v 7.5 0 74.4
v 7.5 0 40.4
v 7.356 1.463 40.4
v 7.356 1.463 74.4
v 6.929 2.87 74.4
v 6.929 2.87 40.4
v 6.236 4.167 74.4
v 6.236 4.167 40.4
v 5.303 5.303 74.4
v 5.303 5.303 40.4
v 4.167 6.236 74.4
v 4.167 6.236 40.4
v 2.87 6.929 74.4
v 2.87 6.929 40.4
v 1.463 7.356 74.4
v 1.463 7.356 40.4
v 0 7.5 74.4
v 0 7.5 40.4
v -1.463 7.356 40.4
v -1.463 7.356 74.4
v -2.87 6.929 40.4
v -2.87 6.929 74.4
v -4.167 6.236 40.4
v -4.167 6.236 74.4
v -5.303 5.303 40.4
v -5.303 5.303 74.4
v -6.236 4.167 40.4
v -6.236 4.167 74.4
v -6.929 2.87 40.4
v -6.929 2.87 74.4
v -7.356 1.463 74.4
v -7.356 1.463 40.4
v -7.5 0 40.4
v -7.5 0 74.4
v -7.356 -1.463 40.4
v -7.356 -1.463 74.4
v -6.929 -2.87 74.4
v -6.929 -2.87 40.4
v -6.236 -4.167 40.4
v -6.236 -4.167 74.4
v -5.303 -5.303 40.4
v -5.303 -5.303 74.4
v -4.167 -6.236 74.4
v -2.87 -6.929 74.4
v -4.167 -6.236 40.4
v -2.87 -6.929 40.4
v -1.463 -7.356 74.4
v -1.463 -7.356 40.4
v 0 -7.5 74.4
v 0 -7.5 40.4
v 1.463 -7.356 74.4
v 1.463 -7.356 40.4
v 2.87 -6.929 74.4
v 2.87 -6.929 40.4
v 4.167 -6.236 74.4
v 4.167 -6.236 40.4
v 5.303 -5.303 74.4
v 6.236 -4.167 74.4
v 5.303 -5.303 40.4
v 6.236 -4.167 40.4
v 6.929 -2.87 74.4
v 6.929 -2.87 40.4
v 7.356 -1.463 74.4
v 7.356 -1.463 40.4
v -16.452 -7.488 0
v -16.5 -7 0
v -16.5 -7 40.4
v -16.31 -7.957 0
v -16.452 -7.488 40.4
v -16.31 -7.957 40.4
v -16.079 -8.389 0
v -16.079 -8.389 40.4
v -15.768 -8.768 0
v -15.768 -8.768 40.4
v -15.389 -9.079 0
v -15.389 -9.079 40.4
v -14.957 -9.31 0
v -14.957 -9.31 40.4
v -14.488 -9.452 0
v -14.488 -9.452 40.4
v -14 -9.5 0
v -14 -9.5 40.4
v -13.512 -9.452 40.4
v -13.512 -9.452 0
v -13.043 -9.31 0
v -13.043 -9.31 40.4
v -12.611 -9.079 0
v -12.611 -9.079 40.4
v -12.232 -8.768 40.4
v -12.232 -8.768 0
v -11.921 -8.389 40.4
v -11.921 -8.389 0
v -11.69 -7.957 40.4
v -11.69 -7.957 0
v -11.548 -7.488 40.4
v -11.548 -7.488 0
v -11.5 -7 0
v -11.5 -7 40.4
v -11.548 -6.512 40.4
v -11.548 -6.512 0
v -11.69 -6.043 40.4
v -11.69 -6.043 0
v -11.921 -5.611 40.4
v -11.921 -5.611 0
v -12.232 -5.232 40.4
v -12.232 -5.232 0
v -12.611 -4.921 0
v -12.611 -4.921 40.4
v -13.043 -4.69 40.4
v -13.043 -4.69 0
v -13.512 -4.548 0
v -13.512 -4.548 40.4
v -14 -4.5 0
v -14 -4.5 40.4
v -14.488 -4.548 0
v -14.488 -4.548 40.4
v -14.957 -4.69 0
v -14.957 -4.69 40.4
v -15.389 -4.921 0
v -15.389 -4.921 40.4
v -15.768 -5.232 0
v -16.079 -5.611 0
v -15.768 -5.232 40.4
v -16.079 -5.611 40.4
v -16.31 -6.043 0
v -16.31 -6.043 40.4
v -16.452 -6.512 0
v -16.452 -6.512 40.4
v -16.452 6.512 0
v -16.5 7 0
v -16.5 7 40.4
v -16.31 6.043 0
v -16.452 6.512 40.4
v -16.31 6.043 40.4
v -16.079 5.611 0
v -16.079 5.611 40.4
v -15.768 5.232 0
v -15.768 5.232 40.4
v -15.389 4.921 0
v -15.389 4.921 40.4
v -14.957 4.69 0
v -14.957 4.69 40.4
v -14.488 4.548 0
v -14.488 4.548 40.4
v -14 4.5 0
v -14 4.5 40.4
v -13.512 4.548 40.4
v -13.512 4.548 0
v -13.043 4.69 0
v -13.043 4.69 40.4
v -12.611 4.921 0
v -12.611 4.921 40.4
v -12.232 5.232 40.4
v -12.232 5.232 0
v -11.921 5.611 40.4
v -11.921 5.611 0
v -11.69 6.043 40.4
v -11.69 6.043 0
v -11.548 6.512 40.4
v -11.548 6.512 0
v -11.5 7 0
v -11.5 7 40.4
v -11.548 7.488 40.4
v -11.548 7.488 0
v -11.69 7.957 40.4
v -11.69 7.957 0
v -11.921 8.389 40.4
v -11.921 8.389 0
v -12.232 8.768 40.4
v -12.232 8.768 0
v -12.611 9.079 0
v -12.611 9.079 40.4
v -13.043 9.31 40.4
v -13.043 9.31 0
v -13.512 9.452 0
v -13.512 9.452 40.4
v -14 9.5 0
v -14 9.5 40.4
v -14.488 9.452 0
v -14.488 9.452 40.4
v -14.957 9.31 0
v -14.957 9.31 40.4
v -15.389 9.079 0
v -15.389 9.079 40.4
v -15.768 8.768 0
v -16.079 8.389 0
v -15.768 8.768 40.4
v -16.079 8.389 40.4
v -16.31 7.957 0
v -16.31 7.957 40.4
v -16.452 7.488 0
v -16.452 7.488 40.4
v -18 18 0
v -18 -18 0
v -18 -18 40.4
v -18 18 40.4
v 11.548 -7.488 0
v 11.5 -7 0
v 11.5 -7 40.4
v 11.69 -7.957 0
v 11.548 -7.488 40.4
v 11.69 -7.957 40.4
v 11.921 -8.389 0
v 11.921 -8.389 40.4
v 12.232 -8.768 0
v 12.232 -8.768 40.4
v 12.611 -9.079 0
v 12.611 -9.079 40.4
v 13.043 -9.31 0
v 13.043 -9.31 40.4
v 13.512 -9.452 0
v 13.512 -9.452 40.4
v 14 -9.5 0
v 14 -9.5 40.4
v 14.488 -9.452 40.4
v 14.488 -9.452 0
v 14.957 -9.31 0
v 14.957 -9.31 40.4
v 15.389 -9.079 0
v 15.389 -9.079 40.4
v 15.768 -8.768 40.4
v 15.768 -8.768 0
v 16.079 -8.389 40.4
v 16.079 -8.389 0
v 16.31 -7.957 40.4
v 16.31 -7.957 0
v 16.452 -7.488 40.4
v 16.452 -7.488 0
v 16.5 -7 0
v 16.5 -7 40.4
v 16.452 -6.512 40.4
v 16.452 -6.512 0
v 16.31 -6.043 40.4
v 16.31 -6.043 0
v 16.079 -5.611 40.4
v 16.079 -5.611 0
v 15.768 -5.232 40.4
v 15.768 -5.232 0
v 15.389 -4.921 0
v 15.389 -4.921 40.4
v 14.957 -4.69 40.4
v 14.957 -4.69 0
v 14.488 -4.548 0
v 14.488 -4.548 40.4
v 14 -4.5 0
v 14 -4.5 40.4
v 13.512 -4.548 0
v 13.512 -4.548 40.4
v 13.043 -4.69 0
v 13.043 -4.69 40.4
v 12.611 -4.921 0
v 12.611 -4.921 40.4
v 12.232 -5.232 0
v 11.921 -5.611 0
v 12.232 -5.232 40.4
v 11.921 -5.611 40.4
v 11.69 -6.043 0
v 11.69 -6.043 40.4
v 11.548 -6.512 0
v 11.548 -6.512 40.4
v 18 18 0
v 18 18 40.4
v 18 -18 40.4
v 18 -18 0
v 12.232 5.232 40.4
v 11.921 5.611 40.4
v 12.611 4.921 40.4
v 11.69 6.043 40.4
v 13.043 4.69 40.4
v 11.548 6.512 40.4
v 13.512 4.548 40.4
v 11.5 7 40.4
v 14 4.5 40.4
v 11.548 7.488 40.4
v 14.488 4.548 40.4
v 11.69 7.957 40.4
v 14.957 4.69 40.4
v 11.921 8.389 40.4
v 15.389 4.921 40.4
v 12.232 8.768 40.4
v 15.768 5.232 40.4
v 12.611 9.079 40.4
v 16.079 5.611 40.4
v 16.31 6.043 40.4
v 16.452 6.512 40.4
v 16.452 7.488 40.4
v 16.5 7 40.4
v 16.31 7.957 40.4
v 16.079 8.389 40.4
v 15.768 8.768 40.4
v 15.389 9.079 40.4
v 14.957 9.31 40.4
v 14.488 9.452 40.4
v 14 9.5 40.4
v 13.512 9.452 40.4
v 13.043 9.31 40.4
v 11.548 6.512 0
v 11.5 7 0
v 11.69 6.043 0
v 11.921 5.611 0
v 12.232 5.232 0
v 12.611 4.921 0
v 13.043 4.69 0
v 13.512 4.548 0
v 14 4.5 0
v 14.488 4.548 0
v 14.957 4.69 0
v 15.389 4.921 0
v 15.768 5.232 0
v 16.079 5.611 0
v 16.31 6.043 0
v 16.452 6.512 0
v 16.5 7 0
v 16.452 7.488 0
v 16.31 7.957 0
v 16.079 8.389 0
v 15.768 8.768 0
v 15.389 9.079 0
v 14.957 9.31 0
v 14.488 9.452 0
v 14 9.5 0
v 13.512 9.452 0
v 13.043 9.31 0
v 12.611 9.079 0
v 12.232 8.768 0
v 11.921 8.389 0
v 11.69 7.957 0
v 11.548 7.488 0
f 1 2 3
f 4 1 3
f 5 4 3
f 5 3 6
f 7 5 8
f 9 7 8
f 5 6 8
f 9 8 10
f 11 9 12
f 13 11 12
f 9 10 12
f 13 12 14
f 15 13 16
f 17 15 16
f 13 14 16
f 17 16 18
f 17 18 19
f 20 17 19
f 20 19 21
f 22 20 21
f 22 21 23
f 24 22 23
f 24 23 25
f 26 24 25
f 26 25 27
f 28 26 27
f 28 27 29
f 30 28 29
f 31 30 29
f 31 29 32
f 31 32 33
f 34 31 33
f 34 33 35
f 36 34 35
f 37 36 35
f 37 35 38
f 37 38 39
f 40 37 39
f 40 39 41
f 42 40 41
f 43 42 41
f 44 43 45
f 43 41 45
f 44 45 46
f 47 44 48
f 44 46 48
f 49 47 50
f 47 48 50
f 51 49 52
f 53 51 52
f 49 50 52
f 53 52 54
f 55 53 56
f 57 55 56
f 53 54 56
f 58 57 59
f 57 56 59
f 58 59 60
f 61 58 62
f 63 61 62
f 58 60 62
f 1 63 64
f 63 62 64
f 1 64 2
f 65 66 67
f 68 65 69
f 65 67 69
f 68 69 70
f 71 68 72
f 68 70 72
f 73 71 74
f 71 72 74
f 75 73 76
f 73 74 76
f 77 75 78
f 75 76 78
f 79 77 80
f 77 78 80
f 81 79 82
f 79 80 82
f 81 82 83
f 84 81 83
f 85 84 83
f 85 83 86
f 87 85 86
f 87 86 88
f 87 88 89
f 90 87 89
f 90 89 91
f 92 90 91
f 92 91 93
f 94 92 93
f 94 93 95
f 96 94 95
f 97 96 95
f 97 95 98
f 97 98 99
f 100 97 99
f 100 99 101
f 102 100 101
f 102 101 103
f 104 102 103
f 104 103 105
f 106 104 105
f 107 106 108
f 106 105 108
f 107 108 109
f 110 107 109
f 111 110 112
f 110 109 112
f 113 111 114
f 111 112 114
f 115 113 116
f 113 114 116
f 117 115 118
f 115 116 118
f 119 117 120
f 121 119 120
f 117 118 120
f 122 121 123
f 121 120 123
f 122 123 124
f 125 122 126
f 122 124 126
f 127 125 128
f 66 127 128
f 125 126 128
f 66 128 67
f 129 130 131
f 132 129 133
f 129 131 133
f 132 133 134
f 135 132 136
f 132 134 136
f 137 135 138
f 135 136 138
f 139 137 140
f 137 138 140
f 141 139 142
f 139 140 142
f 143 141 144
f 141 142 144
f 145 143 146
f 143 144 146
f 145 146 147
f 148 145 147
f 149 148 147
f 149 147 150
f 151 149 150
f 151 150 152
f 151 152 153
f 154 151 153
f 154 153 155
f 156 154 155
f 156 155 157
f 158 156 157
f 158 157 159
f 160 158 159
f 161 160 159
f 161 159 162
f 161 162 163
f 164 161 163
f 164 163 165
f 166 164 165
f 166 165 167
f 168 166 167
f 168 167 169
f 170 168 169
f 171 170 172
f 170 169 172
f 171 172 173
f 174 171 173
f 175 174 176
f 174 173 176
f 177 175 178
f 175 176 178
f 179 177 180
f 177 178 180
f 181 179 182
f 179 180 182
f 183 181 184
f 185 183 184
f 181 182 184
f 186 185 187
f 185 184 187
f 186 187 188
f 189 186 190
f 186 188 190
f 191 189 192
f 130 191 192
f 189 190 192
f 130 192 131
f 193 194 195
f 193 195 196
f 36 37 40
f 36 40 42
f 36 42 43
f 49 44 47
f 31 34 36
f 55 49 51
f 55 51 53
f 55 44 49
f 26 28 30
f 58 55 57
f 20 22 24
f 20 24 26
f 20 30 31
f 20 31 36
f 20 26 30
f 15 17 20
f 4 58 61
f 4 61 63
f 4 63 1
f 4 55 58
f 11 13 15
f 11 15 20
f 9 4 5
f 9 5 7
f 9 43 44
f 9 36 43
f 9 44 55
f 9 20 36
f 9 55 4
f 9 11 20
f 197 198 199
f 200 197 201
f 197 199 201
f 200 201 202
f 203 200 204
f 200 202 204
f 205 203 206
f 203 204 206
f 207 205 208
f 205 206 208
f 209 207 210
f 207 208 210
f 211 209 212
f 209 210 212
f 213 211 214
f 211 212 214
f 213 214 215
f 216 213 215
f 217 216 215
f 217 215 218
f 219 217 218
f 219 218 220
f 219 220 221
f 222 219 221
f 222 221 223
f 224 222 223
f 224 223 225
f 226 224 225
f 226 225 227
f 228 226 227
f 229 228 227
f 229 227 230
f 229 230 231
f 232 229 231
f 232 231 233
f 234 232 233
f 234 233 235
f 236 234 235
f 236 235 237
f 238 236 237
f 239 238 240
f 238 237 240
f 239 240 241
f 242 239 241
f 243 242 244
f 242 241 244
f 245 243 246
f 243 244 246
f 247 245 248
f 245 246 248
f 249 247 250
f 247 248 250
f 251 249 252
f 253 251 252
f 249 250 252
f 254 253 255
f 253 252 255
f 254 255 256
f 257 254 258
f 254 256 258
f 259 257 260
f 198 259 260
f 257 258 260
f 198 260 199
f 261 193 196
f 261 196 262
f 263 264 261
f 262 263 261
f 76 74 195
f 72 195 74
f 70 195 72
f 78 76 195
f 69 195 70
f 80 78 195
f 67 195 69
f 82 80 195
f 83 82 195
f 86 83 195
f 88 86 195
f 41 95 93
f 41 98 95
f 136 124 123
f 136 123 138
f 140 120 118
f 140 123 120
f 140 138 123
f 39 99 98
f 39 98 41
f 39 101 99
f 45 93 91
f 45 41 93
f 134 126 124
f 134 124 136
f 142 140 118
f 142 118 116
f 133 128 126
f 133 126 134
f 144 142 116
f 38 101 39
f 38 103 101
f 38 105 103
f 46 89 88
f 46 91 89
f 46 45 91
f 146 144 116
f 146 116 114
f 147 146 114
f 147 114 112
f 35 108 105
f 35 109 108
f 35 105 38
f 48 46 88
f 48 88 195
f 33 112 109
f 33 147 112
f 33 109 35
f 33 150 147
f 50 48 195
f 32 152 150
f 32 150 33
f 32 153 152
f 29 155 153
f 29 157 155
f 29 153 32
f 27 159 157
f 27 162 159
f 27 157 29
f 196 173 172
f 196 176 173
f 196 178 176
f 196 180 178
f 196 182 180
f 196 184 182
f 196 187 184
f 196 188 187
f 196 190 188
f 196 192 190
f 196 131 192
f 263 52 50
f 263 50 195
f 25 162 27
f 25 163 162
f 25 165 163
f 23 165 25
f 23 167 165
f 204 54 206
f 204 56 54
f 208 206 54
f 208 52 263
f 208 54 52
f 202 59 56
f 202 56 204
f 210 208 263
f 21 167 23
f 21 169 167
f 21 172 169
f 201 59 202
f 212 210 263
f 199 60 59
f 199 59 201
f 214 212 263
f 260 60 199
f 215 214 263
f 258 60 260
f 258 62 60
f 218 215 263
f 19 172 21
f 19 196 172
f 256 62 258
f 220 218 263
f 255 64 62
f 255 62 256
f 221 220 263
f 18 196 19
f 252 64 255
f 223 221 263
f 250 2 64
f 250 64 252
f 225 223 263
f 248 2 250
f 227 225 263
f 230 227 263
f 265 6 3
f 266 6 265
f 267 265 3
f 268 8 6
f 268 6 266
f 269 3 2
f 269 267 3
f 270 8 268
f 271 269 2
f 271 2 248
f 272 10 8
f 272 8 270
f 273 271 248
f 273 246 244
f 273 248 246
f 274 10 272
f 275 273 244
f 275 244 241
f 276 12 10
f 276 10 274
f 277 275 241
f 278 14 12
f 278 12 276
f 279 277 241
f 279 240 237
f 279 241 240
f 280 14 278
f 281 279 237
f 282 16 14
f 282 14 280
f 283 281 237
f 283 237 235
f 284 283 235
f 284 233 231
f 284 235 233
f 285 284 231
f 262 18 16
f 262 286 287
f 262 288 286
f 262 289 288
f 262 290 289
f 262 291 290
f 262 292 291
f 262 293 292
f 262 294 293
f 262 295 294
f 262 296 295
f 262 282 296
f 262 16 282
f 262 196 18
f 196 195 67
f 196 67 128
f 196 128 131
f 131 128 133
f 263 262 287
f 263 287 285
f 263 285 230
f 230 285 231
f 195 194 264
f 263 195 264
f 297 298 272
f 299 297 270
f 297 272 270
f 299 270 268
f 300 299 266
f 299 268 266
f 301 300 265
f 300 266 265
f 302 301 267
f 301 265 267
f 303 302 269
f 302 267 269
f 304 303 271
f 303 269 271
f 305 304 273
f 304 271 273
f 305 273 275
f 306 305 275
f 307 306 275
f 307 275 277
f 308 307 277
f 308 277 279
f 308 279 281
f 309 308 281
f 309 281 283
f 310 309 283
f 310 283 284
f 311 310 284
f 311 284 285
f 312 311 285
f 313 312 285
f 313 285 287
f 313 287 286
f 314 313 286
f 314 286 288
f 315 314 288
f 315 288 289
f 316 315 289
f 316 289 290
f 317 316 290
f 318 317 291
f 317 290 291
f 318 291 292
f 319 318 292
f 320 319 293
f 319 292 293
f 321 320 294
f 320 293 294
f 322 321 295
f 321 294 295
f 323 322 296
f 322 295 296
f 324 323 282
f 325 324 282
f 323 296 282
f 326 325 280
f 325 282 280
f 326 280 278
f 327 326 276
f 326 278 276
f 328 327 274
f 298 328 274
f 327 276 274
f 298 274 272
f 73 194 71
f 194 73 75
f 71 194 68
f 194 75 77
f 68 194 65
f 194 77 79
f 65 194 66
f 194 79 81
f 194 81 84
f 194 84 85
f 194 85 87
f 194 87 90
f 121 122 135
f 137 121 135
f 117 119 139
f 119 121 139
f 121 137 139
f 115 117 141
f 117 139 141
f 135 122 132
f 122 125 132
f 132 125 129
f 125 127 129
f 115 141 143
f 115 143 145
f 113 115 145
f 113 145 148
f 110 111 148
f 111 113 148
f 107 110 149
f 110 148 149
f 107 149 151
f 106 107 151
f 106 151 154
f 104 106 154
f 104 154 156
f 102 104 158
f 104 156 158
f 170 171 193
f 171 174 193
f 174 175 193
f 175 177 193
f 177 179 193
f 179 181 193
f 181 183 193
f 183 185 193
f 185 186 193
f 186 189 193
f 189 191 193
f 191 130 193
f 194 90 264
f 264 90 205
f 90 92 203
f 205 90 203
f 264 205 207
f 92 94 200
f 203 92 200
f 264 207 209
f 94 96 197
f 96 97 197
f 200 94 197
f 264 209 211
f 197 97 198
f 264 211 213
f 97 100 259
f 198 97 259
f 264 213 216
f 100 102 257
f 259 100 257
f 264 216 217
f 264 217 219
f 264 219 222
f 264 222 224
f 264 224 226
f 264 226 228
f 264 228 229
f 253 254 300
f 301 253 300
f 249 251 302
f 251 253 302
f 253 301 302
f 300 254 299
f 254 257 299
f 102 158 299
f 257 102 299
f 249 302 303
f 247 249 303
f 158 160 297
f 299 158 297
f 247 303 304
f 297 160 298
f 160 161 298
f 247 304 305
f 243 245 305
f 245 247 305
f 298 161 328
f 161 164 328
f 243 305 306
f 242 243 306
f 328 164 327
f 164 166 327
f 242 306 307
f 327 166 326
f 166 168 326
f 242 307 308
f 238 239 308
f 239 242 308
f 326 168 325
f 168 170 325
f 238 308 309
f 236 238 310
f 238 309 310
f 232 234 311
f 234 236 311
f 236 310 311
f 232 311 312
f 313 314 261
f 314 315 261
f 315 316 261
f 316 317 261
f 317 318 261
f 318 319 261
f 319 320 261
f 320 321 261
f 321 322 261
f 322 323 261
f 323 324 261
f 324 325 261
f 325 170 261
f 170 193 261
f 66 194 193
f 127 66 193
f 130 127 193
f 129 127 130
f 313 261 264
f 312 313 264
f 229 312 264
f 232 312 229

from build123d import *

# Parameters (mm, degrees)
F0_R     = 7.5
F1_DEPTH = 74.4
F0_W     = 36
F0_H     = 36
F2_DEPTH = 40.4
F4_D     = 5


with BuildPart() as f1:
    # F0 (on Top) → F1 (new body)
    with BuildSketch(Plane.XY):
        Circle(F0_R)
    extrude(amount=F1_DEPTH)

    # F0 (on Top) → F2 (join)
    with BuildSketch(Plane.XY):
        Rectangle(F0_W, F0_H)
        Circle(F0_R, mode=Mode.SUBTRACT)
    extrude(amount=F2_DEPTH)

    # F4 (through all)
    with Locations(Plane(origin=(0, 0, 0), x_dir=(1, 0, 0), z_dir=(0, 0, -1))):
        with Locations((-14, 7), (14, 7), (14, -7), (-14, -7)):
            Hole(F4_D / 2)


solid = f1.part
